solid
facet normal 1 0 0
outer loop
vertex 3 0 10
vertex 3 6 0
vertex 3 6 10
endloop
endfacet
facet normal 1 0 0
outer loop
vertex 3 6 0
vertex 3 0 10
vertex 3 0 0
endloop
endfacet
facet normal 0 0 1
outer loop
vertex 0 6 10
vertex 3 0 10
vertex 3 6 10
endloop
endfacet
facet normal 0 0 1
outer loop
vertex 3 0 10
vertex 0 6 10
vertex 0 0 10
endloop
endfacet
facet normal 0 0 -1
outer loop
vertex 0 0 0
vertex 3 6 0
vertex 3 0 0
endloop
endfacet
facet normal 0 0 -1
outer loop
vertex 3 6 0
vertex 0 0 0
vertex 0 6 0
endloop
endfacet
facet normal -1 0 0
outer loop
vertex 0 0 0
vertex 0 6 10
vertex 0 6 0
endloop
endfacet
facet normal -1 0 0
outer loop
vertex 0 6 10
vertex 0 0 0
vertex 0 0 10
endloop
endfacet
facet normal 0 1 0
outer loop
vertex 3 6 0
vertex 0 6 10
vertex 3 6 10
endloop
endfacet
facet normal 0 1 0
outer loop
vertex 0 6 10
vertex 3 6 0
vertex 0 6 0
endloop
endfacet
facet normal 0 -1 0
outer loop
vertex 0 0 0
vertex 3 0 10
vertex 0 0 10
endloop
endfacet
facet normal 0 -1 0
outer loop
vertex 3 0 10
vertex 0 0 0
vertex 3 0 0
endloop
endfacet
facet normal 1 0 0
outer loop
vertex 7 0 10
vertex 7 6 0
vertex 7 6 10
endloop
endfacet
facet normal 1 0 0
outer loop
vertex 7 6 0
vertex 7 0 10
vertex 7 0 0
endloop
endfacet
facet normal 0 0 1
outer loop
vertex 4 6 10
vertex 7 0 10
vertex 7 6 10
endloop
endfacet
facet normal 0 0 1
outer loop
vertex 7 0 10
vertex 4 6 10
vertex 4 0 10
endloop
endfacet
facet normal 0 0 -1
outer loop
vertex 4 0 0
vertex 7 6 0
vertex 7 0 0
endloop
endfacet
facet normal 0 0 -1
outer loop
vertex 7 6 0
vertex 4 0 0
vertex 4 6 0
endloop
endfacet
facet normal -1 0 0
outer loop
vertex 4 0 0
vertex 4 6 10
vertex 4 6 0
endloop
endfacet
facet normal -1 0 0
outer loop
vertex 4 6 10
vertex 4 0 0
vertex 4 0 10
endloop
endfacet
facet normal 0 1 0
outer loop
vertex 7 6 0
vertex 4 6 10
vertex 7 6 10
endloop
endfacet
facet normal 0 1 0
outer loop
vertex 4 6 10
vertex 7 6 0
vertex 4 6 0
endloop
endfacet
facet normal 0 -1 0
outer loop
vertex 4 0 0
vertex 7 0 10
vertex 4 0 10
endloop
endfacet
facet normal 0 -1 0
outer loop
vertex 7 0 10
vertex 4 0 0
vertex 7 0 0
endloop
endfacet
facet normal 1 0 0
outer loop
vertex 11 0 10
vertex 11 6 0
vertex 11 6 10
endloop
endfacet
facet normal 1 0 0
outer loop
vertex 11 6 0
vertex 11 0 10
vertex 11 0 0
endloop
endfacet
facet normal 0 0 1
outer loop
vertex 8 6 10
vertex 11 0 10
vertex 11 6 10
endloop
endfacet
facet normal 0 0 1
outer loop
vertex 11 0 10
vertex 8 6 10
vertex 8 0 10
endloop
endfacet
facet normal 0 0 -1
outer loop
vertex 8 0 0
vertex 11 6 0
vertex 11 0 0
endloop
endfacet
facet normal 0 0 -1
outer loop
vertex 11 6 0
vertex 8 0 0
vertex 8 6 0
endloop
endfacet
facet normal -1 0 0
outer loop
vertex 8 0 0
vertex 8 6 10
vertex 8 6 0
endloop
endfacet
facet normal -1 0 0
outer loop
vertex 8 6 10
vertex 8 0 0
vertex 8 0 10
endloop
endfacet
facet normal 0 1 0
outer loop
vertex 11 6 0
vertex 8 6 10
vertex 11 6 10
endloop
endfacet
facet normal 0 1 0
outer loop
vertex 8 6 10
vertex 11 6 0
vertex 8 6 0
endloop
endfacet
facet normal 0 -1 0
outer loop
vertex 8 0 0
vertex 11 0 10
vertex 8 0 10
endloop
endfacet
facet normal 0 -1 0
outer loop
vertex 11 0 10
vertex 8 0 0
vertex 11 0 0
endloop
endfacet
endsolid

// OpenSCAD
$fa = 2;
$fs = 1;




difference() {
   union() {
      translate([0, 0, 0]) cube([3, 6, 10]);
      translate([4, 0, 0]) cube([3, 6, 10]);
      translate([8, 0, 0]) cube([3, 6, 10]);
   }

   translate([-2, 7, 0])
      rotate([30, 0, 0])
         cube([20, 20, 20]);
}      

translate([0, 0, 0]) cube([3, 6, 10]);
translate([4, 0, 0]) cube([3, 6, 10]);
translate([8, 0, 0]) cube([3, 6, 10]);
      
